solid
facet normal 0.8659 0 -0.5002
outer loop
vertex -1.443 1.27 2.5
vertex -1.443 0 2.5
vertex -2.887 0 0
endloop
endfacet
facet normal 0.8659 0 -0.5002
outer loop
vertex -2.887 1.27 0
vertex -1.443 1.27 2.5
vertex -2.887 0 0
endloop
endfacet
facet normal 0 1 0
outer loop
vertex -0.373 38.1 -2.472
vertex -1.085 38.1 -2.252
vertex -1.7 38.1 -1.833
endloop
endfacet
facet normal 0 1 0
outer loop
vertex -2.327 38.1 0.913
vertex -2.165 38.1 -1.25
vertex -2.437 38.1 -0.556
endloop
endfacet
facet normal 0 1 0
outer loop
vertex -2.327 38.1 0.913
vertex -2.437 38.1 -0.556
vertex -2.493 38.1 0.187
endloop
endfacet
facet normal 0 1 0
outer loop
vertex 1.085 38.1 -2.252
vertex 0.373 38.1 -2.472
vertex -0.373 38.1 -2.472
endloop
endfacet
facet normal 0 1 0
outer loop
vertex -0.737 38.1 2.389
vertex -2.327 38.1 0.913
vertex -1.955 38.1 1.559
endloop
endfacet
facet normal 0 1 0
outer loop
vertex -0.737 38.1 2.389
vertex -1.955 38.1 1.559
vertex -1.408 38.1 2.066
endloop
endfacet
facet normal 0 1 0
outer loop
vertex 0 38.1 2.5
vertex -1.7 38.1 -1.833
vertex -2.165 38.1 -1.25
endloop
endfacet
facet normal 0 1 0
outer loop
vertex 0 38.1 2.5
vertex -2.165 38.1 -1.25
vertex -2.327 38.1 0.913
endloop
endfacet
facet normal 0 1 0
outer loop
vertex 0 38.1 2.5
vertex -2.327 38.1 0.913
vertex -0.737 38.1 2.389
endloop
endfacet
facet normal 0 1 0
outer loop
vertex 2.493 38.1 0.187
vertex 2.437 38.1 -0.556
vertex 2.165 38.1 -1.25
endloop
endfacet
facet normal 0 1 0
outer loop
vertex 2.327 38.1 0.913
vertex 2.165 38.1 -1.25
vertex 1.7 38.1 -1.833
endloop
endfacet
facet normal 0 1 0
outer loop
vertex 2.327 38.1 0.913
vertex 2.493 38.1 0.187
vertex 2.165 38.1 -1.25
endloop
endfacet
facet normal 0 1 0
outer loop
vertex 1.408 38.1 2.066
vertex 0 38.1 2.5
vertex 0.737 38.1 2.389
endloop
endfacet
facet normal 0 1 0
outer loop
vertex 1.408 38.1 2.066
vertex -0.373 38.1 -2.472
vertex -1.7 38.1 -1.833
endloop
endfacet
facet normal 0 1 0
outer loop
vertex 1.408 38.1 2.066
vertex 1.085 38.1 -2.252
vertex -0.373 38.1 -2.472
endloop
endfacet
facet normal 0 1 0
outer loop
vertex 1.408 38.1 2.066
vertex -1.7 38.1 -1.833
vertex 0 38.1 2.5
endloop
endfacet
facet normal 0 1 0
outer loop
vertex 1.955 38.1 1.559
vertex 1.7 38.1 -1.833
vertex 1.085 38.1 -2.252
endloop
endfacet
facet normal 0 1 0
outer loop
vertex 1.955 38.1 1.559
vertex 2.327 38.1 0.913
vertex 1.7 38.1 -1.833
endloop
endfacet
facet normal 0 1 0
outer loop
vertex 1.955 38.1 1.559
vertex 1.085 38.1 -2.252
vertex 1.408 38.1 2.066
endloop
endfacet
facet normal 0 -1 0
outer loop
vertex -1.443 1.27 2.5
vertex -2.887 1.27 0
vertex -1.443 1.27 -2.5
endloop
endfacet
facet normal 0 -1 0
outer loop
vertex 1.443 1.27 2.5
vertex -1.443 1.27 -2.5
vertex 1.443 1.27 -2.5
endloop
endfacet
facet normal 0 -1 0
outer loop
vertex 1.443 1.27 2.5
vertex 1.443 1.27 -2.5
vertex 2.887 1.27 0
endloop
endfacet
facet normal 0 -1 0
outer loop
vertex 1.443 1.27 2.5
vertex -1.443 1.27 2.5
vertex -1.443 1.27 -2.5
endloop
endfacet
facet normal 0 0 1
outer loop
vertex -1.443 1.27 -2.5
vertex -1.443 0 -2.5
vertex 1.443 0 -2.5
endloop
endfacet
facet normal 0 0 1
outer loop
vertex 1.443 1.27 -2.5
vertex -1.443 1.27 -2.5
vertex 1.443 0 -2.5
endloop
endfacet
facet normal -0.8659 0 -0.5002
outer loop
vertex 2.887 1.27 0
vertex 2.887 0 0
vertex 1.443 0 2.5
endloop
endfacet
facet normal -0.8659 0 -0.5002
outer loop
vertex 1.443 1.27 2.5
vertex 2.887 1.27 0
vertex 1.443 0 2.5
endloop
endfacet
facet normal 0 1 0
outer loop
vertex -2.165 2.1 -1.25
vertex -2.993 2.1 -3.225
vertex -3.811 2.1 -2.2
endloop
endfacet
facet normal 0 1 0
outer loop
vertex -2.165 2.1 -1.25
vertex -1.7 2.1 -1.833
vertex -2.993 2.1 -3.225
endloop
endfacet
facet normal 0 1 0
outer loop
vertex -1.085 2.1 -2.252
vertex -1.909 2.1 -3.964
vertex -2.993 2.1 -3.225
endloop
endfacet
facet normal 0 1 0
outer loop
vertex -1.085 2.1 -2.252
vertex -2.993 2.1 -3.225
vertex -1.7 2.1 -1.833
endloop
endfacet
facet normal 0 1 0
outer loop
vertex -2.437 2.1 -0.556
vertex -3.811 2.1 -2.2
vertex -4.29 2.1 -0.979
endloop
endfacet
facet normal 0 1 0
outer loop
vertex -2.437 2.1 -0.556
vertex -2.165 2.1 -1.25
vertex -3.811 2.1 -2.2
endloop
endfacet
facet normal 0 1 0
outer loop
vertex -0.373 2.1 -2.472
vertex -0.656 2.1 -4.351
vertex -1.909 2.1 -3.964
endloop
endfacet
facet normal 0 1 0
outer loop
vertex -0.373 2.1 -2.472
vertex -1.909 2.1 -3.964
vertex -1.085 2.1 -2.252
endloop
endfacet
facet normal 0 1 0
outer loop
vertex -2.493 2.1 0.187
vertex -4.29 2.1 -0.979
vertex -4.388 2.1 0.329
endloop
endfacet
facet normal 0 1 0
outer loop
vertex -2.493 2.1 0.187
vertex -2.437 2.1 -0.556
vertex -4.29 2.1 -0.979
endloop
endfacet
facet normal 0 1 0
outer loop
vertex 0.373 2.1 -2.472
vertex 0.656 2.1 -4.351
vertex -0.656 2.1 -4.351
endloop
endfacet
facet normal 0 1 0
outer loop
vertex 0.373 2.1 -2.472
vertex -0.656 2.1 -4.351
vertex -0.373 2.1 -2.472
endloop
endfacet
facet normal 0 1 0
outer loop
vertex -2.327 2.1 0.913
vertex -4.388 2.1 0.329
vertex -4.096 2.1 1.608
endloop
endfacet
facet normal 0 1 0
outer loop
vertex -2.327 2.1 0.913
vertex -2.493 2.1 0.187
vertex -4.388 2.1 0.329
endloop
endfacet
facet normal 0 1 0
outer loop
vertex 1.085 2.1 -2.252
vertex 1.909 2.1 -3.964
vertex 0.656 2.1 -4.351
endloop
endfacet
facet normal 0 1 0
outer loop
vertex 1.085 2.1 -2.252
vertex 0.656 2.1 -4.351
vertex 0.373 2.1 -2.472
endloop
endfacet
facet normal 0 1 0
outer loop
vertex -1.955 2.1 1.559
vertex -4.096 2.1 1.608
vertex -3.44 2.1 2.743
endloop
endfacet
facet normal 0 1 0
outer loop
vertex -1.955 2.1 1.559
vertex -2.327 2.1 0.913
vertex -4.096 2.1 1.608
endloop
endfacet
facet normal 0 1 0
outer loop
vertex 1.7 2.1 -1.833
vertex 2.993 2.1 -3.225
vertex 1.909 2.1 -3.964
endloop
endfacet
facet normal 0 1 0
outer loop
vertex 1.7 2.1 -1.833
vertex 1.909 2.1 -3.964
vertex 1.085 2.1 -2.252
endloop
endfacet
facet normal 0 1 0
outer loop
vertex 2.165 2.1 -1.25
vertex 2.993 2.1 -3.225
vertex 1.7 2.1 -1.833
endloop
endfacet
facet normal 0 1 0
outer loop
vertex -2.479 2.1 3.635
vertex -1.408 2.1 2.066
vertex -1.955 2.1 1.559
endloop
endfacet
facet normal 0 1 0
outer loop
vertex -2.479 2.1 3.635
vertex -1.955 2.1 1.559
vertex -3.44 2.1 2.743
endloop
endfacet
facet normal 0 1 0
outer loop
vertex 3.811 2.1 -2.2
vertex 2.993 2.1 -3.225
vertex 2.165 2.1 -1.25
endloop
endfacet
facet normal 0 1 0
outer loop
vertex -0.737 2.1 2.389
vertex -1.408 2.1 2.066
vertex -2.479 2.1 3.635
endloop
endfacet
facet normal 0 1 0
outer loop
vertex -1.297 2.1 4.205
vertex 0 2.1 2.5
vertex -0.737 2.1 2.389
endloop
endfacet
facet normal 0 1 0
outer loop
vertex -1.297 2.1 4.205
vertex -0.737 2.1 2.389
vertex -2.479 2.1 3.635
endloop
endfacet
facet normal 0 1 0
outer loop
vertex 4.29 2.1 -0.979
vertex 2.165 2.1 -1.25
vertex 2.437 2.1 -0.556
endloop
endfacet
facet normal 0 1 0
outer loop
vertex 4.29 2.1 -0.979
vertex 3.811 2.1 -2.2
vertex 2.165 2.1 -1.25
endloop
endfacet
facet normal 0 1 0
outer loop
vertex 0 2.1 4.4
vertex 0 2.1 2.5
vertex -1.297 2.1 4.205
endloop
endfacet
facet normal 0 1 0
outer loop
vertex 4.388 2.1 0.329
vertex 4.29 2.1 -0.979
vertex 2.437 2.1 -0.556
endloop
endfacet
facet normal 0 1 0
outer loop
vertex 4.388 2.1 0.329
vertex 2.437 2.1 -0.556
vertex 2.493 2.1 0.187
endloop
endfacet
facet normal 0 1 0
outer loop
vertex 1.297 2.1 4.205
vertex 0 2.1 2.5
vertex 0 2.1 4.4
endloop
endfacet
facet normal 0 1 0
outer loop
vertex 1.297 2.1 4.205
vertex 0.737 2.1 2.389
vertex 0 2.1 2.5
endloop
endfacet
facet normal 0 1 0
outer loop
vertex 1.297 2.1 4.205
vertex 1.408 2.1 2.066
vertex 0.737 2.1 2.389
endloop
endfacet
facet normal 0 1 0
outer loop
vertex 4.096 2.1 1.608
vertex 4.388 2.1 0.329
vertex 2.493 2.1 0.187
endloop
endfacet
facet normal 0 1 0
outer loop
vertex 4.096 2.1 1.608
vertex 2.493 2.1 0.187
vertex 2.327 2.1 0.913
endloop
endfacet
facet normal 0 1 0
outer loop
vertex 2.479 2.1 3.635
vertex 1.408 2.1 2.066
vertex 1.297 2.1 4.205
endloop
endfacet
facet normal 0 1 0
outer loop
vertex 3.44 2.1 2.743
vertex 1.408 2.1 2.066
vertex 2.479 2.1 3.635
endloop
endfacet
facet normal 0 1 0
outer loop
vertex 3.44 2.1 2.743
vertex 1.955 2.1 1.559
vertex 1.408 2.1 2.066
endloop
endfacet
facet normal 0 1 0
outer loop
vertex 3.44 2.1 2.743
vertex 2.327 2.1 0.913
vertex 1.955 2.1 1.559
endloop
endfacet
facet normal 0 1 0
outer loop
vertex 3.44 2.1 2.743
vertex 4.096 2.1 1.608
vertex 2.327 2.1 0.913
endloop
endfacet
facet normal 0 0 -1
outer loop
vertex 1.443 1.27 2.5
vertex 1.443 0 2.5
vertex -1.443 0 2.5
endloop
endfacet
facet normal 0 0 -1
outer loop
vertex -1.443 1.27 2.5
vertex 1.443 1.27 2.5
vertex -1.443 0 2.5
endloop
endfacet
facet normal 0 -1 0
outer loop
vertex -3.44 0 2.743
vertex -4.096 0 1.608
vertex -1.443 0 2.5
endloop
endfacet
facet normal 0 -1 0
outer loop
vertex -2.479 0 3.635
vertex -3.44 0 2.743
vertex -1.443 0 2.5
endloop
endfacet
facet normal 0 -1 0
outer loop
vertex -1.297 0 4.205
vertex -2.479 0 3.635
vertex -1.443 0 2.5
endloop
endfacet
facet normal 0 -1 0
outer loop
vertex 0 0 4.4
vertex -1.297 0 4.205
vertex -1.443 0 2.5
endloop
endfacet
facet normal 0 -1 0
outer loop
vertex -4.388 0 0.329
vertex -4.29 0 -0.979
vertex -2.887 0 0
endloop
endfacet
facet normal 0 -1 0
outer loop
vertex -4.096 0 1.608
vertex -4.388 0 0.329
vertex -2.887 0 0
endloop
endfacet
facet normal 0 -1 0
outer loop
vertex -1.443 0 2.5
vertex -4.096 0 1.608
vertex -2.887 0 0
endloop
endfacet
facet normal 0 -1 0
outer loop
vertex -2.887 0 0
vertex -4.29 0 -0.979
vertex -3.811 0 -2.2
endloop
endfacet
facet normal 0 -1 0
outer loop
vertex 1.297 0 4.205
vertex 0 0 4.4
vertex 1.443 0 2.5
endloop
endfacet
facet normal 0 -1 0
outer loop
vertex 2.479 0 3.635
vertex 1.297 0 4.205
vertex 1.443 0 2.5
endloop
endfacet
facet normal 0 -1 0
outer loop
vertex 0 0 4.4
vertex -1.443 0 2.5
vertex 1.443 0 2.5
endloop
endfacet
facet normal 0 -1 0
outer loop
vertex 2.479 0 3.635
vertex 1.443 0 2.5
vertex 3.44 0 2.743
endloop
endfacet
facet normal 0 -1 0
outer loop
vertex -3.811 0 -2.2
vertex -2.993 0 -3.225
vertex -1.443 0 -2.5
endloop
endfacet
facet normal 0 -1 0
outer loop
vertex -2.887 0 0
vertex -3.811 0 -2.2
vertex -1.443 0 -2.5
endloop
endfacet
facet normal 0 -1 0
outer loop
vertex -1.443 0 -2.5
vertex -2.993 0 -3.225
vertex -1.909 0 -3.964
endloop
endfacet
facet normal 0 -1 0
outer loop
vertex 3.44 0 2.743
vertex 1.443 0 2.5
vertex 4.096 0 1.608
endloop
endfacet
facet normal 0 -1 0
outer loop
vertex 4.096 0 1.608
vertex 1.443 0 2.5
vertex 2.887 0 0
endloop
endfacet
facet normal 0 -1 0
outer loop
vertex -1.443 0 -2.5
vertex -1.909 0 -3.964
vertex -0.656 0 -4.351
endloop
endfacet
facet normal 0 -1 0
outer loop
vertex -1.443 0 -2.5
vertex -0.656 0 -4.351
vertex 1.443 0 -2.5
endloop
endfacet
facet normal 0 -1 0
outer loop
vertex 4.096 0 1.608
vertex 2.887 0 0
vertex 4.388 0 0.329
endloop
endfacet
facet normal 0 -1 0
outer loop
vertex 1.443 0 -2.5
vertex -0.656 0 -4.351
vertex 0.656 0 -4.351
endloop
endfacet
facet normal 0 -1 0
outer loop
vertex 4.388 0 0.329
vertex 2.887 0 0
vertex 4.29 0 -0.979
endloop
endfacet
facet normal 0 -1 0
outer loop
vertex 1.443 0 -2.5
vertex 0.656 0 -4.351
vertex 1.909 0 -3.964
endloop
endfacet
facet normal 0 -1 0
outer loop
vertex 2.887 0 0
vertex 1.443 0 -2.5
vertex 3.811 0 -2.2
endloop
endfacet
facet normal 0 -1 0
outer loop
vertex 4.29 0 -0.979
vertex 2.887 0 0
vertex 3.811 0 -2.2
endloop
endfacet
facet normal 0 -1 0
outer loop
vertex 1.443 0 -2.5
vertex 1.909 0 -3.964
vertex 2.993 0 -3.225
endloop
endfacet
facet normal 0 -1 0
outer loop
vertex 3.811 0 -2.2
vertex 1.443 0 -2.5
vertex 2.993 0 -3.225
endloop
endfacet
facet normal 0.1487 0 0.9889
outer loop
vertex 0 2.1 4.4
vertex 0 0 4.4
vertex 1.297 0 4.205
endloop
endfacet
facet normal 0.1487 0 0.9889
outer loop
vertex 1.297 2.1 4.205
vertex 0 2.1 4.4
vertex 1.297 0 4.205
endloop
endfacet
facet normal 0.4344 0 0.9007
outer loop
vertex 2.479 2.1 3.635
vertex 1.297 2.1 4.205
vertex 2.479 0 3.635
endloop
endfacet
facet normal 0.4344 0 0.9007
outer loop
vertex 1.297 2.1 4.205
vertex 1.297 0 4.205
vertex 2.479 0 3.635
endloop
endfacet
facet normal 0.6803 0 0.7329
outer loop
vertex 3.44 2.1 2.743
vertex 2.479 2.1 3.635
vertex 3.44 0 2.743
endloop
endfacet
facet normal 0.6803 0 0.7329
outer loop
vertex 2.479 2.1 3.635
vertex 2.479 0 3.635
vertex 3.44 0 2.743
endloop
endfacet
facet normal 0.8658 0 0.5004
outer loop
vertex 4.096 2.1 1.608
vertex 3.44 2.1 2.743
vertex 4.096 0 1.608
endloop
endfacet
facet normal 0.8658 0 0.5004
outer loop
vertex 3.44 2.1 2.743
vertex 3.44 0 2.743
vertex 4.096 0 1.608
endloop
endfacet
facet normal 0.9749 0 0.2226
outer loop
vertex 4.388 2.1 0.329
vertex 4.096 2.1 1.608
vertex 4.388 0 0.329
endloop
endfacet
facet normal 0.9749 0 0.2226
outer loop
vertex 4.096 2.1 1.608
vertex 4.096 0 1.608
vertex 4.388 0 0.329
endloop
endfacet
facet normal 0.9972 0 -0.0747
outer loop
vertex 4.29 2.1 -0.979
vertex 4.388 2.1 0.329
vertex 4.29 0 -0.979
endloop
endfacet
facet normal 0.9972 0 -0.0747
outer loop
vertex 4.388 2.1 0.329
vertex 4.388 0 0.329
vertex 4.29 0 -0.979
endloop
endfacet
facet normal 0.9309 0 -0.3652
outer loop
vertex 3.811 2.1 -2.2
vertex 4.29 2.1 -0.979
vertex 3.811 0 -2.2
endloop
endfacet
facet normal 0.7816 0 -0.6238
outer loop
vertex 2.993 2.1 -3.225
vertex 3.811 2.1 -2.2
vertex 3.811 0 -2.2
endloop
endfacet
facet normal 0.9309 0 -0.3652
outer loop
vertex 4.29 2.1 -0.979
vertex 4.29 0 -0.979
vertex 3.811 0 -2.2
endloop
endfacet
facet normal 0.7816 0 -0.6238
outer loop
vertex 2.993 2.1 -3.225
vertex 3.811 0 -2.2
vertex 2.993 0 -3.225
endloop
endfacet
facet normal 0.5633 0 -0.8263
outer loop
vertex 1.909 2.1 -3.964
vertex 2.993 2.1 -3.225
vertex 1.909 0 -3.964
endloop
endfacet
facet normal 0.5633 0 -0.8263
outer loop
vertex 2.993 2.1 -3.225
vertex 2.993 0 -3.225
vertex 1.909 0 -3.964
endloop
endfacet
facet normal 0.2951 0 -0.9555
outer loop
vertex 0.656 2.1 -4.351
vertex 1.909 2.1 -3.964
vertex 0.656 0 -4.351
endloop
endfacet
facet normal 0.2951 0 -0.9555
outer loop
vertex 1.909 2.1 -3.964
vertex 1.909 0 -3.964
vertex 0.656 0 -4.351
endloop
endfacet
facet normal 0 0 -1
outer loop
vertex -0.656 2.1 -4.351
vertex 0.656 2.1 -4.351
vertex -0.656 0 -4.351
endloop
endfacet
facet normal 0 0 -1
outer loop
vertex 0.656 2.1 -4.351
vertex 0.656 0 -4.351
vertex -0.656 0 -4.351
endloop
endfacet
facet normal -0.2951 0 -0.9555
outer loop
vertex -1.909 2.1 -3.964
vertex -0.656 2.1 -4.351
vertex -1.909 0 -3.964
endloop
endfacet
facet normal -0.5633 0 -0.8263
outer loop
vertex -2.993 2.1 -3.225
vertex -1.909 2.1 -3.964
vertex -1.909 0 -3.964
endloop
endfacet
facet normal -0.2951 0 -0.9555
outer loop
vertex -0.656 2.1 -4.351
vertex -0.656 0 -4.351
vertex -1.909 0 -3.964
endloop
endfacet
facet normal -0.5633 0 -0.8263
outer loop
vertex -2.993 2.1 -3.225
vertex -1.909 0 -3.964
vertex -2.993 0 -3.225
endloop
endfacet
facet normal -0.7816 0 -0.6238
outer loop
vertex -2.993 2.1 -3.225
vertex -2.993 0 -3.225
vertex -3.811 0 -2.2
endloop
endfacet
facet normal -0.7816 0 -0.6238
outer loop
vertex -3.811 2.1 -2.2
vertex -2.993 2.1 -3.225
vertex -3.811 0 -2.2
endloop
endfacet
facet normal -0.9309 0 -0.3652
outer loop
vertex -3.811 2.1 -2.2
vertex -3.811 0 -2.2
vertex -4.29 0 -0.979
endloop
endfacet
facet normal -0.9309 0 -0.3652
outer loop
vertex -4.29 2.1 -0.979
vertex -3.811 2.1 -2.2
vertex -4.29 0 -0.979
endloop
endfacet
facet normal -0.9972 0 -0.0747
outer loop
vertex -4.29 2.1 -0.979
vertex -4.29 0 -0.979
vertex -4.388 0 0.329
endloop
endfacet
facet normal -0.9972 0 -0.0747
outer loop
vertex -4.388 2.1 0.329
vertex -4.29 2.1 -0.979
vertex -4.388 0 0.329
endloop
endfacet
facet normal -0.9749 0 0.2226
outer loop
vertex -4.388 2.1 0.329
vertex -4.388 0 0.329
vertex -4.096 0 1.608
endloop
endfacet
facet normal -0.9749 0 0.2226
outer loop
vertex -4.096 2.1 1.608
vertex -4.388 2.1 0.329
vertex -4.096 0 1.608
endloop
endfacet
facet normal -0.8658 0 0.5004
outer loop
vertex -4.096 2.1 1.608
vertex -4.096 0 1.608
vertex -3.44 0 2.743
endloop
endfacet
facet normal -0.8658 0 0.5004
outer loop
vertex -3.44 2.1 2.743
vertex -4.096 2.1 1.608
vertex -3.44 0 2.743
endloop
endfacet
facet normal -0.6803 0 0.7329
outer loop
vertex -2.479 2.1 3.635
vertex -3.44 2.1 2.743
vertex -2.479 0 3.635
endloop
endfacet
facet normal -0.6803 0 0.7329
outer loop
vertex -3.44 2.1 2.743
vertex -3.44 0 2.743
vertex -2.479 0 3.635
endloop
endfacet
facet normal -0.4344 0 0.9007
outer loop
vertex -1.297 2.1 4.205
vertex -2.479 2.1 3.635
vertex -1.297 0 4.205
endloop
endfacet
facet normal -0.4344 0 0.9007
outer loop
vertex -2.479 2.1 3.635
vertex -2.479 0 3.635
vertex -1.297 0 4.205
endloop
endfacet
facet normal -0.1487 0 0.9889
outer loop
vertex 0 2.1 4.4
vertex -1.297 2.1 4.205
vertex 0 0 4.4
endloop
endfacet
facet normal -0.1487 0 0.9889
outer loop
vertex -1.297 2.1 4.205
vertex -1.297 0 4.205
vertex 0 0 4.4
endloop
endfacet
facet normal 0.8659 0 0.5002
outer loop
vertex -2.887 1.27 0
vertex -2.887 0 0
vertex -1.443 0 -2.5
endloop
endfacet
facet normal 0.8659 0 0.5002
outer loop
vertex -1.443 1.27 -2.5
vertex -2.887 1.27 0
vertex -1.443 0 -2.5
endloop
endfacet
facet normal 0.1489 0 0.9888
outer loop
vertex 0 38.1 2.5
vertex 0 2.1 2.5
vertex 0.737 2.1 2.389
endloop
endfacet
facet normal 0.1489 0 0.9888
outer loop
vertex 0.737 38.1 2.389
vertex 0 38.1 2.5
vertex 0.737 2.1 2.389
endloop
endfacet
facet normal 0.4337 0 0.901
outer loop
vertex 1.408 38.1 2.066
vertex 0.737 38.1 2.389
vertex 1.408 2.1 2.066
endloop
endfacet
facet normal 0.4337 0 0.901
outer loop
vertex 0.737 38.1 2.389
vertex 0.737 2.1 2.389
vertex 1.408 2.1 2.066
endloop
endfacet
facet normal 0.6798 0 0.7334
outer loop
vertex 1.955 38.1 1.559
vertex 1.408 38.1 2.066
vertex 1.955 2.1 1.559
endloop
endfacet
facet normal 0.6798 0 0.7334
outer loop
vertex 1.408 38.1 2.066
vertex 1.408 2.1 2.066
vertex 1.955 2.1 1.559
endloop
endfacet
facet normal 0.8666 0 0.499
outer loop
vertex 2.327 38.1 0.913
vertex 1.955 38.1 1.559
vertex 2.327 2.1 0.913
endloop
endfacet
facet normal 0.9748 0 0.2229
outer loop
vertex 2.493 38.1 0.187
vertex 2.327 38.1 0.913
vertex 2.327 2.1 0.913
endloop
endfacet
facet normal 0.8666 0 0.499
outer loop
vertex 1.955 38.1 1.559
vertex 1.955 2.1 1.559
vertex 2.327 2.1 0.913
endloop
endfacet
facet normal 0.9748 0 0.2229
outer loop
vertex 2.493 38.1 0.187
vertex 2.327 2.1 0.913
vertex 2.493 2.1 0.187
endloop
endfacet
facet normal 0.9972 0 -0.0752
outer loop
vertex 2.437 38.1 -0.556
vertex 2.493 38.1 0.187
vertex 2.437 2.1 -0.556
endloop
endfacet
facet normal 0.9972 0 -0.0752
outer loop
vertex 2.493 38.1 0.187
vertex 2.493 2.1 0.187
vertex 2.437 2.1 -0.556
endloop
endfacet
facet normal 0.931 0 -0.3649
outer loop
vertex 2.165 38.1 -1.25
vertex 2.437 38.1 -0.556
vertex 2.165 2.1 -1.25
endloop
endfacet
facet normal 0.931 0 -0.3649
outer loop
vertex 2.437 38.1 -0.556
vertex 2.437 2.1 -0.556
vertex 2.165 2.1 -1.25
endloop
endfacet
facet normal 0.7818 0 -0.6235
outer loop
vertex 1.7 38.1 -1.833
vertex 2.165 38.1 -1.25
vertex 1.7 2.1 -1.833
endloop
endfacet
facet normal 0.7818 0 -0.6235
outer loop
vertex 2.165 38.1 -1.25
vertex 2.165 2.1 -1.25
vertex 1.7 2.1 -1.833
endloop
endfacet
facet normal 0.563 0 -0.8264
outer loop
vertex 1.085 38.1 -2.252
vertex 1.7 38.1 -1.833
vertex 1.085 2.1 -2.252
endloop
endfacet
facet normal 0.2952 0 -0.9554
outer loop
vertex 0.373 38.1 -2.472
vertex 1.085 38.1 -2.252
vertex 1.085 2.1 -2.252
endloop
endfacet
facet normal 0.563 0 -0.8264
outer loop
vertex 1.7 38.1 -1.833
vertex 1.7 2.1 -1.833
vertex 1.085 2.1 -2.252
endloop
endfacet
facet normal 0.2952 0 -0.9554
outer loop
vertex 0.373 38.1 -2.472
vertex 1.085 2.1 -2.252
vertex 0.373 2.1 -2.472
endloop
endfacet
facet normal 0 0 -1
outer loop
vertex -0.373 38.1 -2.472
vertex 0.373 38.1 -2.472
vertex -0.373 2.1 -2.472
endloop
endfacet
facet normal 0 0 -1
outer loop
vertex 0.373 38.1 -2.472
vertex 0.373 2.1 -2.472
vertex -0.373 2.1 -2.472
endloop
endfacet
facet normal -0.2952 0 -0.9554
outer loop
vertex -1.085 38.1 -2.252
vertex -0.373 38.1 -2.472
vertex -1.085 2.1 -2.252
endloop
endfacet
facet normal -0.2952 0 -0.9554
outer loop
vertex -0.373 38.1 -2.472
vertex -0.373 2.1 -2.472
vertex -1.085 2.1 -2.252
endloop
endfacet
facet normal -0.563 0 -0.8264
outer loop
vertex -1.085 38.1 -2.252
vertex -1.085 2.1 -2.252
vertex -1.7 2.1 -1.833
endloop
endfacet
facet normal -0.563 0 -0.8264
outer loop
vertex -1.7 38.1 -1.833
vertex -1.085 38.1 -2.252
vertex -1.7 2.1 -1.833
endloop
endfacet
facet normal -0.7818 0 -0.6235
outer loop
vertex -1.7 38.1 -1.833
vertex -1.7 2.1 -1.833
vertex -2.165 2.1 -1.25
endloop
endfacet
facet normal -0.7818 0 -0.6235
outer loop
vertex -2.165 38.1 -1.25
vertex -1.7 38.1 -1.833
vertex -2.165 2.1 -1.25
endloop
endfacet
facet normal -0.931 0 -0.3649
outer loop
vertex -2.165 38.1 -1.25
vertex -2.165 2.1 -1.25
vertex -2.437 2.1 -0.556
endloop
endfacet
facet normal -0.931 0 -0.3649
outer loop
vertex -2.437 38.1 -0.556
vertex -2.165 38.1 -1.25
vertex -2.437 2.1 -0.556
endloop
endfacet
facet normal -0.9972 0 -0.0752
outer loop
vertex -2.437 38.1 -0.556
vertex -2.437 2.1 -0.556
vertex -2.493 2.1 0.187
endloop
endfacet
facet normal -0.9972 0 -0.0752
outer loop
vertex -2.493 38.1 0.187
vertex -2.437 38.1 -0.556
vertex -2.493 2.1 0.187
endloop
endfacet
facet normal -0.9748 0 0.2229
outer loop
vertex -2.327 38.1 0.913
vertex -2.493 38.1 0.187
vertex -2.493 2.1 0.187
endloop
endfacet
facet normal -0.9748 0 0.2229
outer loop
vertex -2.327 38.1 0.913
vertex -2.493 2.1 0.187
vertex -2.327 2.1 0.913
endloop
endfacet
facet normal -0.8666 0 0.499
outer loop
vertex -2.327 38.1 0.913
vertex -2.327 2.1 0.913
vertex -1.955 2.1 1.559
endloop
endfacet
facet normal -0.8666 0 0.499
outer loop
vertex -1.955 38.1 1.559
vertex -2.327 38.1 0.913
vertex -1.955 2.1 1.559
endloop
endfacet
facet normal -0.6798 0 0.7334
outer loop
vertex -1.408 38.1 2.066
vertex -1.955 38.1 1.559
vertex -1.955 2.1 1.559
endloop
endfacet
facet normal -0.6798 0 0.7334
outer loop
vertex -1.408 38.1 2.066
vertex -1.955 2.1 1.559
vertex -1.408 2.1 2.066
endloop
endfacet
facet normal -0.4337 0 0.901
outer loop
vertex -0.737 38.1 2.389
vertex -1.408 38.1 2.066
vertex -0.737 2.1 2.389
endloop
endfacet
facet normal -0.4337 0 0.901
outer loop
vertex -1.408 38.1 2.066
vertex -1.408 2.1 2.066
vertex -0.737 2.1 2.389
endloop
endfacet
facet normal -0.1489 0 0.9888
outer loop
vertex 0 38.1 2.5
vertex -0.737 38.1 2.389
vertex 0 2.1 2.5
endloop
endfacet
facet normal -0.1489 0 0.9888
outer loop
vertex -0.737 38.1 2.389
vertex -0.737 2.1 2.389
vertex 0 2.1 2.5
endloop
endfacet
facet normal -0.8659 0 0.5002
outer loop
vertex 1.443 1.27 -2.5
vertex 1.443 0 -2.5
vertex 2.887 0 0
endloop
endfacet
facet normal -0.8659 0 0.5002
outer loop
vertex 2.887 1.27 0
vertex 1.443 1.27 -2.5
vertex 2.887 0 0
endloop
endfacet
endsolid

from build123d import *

# Parameters (mm, degrees)
SKETCH1_R           = 4.4
SKETCH1_R_2         = 2.5
BOSS_EXTRUDE1_DEPTH = 2.1
CUT_EXTRUDE1_DEPTH  = 1.27
SKETCH3_R           = 2.5
BOSS_EXTRUDE2_DEPTH = 36


with BuildPart() as part:
    # Sketch1 → Boss-Extrude1 (new body)
    # profile 1 of 2: a face of its own
    with BuildSketch(Plane(origin=(0, 0, 0), x_dir=(1, 0, 0), z_dir=(0, 1, 0))):
        with Locations(Location((0, 0, 0), (0, 0, 270))):
            Circle(SKETCH1_R)
        Circle(SKETCH1_R_2, mode=Mode.SUBTRACT)
    # profile 2 of 2: a face of its own
    with BuildSketch(Plane(origin=(0, 0, 0), x_dir=(1, 0, 0), z_dir=(0, 1, 0))):
        Circle(SKETCH1_R_2)
    extrude(amount=BOSS_EXTRUDE1_DEPTH)

    # Sketch2 → Cut-Extrude1 (cut)
    with BuildSketch(Plane.XZ):
        Polygon((2.886751346, 0), (1.443375673, 2.5), (-1.443375673, 2.5), (-2.886751346, 0), (-1.443375673, -2.5), (1.443375673, -2.5), align=None)
    extrude(amount=-CUT_EXTRUDE1_DEPTH, mode=Mode.SUBTRACT)

    # Sketch3 → Boss-Extrude2 (add)
    with BuildSketch(Plane(origin=(0, 2.1, 0), x_dir=(1, 0, 0), z_dir=(0, 1, 0))):
        with Locations(Location((0, 0, 0), (0, 0, 270))):
            Circle(SKETCH3_R)
    extrude(amount=BOSS_EXTRUDE2_DEPTH)


solid = part.part
